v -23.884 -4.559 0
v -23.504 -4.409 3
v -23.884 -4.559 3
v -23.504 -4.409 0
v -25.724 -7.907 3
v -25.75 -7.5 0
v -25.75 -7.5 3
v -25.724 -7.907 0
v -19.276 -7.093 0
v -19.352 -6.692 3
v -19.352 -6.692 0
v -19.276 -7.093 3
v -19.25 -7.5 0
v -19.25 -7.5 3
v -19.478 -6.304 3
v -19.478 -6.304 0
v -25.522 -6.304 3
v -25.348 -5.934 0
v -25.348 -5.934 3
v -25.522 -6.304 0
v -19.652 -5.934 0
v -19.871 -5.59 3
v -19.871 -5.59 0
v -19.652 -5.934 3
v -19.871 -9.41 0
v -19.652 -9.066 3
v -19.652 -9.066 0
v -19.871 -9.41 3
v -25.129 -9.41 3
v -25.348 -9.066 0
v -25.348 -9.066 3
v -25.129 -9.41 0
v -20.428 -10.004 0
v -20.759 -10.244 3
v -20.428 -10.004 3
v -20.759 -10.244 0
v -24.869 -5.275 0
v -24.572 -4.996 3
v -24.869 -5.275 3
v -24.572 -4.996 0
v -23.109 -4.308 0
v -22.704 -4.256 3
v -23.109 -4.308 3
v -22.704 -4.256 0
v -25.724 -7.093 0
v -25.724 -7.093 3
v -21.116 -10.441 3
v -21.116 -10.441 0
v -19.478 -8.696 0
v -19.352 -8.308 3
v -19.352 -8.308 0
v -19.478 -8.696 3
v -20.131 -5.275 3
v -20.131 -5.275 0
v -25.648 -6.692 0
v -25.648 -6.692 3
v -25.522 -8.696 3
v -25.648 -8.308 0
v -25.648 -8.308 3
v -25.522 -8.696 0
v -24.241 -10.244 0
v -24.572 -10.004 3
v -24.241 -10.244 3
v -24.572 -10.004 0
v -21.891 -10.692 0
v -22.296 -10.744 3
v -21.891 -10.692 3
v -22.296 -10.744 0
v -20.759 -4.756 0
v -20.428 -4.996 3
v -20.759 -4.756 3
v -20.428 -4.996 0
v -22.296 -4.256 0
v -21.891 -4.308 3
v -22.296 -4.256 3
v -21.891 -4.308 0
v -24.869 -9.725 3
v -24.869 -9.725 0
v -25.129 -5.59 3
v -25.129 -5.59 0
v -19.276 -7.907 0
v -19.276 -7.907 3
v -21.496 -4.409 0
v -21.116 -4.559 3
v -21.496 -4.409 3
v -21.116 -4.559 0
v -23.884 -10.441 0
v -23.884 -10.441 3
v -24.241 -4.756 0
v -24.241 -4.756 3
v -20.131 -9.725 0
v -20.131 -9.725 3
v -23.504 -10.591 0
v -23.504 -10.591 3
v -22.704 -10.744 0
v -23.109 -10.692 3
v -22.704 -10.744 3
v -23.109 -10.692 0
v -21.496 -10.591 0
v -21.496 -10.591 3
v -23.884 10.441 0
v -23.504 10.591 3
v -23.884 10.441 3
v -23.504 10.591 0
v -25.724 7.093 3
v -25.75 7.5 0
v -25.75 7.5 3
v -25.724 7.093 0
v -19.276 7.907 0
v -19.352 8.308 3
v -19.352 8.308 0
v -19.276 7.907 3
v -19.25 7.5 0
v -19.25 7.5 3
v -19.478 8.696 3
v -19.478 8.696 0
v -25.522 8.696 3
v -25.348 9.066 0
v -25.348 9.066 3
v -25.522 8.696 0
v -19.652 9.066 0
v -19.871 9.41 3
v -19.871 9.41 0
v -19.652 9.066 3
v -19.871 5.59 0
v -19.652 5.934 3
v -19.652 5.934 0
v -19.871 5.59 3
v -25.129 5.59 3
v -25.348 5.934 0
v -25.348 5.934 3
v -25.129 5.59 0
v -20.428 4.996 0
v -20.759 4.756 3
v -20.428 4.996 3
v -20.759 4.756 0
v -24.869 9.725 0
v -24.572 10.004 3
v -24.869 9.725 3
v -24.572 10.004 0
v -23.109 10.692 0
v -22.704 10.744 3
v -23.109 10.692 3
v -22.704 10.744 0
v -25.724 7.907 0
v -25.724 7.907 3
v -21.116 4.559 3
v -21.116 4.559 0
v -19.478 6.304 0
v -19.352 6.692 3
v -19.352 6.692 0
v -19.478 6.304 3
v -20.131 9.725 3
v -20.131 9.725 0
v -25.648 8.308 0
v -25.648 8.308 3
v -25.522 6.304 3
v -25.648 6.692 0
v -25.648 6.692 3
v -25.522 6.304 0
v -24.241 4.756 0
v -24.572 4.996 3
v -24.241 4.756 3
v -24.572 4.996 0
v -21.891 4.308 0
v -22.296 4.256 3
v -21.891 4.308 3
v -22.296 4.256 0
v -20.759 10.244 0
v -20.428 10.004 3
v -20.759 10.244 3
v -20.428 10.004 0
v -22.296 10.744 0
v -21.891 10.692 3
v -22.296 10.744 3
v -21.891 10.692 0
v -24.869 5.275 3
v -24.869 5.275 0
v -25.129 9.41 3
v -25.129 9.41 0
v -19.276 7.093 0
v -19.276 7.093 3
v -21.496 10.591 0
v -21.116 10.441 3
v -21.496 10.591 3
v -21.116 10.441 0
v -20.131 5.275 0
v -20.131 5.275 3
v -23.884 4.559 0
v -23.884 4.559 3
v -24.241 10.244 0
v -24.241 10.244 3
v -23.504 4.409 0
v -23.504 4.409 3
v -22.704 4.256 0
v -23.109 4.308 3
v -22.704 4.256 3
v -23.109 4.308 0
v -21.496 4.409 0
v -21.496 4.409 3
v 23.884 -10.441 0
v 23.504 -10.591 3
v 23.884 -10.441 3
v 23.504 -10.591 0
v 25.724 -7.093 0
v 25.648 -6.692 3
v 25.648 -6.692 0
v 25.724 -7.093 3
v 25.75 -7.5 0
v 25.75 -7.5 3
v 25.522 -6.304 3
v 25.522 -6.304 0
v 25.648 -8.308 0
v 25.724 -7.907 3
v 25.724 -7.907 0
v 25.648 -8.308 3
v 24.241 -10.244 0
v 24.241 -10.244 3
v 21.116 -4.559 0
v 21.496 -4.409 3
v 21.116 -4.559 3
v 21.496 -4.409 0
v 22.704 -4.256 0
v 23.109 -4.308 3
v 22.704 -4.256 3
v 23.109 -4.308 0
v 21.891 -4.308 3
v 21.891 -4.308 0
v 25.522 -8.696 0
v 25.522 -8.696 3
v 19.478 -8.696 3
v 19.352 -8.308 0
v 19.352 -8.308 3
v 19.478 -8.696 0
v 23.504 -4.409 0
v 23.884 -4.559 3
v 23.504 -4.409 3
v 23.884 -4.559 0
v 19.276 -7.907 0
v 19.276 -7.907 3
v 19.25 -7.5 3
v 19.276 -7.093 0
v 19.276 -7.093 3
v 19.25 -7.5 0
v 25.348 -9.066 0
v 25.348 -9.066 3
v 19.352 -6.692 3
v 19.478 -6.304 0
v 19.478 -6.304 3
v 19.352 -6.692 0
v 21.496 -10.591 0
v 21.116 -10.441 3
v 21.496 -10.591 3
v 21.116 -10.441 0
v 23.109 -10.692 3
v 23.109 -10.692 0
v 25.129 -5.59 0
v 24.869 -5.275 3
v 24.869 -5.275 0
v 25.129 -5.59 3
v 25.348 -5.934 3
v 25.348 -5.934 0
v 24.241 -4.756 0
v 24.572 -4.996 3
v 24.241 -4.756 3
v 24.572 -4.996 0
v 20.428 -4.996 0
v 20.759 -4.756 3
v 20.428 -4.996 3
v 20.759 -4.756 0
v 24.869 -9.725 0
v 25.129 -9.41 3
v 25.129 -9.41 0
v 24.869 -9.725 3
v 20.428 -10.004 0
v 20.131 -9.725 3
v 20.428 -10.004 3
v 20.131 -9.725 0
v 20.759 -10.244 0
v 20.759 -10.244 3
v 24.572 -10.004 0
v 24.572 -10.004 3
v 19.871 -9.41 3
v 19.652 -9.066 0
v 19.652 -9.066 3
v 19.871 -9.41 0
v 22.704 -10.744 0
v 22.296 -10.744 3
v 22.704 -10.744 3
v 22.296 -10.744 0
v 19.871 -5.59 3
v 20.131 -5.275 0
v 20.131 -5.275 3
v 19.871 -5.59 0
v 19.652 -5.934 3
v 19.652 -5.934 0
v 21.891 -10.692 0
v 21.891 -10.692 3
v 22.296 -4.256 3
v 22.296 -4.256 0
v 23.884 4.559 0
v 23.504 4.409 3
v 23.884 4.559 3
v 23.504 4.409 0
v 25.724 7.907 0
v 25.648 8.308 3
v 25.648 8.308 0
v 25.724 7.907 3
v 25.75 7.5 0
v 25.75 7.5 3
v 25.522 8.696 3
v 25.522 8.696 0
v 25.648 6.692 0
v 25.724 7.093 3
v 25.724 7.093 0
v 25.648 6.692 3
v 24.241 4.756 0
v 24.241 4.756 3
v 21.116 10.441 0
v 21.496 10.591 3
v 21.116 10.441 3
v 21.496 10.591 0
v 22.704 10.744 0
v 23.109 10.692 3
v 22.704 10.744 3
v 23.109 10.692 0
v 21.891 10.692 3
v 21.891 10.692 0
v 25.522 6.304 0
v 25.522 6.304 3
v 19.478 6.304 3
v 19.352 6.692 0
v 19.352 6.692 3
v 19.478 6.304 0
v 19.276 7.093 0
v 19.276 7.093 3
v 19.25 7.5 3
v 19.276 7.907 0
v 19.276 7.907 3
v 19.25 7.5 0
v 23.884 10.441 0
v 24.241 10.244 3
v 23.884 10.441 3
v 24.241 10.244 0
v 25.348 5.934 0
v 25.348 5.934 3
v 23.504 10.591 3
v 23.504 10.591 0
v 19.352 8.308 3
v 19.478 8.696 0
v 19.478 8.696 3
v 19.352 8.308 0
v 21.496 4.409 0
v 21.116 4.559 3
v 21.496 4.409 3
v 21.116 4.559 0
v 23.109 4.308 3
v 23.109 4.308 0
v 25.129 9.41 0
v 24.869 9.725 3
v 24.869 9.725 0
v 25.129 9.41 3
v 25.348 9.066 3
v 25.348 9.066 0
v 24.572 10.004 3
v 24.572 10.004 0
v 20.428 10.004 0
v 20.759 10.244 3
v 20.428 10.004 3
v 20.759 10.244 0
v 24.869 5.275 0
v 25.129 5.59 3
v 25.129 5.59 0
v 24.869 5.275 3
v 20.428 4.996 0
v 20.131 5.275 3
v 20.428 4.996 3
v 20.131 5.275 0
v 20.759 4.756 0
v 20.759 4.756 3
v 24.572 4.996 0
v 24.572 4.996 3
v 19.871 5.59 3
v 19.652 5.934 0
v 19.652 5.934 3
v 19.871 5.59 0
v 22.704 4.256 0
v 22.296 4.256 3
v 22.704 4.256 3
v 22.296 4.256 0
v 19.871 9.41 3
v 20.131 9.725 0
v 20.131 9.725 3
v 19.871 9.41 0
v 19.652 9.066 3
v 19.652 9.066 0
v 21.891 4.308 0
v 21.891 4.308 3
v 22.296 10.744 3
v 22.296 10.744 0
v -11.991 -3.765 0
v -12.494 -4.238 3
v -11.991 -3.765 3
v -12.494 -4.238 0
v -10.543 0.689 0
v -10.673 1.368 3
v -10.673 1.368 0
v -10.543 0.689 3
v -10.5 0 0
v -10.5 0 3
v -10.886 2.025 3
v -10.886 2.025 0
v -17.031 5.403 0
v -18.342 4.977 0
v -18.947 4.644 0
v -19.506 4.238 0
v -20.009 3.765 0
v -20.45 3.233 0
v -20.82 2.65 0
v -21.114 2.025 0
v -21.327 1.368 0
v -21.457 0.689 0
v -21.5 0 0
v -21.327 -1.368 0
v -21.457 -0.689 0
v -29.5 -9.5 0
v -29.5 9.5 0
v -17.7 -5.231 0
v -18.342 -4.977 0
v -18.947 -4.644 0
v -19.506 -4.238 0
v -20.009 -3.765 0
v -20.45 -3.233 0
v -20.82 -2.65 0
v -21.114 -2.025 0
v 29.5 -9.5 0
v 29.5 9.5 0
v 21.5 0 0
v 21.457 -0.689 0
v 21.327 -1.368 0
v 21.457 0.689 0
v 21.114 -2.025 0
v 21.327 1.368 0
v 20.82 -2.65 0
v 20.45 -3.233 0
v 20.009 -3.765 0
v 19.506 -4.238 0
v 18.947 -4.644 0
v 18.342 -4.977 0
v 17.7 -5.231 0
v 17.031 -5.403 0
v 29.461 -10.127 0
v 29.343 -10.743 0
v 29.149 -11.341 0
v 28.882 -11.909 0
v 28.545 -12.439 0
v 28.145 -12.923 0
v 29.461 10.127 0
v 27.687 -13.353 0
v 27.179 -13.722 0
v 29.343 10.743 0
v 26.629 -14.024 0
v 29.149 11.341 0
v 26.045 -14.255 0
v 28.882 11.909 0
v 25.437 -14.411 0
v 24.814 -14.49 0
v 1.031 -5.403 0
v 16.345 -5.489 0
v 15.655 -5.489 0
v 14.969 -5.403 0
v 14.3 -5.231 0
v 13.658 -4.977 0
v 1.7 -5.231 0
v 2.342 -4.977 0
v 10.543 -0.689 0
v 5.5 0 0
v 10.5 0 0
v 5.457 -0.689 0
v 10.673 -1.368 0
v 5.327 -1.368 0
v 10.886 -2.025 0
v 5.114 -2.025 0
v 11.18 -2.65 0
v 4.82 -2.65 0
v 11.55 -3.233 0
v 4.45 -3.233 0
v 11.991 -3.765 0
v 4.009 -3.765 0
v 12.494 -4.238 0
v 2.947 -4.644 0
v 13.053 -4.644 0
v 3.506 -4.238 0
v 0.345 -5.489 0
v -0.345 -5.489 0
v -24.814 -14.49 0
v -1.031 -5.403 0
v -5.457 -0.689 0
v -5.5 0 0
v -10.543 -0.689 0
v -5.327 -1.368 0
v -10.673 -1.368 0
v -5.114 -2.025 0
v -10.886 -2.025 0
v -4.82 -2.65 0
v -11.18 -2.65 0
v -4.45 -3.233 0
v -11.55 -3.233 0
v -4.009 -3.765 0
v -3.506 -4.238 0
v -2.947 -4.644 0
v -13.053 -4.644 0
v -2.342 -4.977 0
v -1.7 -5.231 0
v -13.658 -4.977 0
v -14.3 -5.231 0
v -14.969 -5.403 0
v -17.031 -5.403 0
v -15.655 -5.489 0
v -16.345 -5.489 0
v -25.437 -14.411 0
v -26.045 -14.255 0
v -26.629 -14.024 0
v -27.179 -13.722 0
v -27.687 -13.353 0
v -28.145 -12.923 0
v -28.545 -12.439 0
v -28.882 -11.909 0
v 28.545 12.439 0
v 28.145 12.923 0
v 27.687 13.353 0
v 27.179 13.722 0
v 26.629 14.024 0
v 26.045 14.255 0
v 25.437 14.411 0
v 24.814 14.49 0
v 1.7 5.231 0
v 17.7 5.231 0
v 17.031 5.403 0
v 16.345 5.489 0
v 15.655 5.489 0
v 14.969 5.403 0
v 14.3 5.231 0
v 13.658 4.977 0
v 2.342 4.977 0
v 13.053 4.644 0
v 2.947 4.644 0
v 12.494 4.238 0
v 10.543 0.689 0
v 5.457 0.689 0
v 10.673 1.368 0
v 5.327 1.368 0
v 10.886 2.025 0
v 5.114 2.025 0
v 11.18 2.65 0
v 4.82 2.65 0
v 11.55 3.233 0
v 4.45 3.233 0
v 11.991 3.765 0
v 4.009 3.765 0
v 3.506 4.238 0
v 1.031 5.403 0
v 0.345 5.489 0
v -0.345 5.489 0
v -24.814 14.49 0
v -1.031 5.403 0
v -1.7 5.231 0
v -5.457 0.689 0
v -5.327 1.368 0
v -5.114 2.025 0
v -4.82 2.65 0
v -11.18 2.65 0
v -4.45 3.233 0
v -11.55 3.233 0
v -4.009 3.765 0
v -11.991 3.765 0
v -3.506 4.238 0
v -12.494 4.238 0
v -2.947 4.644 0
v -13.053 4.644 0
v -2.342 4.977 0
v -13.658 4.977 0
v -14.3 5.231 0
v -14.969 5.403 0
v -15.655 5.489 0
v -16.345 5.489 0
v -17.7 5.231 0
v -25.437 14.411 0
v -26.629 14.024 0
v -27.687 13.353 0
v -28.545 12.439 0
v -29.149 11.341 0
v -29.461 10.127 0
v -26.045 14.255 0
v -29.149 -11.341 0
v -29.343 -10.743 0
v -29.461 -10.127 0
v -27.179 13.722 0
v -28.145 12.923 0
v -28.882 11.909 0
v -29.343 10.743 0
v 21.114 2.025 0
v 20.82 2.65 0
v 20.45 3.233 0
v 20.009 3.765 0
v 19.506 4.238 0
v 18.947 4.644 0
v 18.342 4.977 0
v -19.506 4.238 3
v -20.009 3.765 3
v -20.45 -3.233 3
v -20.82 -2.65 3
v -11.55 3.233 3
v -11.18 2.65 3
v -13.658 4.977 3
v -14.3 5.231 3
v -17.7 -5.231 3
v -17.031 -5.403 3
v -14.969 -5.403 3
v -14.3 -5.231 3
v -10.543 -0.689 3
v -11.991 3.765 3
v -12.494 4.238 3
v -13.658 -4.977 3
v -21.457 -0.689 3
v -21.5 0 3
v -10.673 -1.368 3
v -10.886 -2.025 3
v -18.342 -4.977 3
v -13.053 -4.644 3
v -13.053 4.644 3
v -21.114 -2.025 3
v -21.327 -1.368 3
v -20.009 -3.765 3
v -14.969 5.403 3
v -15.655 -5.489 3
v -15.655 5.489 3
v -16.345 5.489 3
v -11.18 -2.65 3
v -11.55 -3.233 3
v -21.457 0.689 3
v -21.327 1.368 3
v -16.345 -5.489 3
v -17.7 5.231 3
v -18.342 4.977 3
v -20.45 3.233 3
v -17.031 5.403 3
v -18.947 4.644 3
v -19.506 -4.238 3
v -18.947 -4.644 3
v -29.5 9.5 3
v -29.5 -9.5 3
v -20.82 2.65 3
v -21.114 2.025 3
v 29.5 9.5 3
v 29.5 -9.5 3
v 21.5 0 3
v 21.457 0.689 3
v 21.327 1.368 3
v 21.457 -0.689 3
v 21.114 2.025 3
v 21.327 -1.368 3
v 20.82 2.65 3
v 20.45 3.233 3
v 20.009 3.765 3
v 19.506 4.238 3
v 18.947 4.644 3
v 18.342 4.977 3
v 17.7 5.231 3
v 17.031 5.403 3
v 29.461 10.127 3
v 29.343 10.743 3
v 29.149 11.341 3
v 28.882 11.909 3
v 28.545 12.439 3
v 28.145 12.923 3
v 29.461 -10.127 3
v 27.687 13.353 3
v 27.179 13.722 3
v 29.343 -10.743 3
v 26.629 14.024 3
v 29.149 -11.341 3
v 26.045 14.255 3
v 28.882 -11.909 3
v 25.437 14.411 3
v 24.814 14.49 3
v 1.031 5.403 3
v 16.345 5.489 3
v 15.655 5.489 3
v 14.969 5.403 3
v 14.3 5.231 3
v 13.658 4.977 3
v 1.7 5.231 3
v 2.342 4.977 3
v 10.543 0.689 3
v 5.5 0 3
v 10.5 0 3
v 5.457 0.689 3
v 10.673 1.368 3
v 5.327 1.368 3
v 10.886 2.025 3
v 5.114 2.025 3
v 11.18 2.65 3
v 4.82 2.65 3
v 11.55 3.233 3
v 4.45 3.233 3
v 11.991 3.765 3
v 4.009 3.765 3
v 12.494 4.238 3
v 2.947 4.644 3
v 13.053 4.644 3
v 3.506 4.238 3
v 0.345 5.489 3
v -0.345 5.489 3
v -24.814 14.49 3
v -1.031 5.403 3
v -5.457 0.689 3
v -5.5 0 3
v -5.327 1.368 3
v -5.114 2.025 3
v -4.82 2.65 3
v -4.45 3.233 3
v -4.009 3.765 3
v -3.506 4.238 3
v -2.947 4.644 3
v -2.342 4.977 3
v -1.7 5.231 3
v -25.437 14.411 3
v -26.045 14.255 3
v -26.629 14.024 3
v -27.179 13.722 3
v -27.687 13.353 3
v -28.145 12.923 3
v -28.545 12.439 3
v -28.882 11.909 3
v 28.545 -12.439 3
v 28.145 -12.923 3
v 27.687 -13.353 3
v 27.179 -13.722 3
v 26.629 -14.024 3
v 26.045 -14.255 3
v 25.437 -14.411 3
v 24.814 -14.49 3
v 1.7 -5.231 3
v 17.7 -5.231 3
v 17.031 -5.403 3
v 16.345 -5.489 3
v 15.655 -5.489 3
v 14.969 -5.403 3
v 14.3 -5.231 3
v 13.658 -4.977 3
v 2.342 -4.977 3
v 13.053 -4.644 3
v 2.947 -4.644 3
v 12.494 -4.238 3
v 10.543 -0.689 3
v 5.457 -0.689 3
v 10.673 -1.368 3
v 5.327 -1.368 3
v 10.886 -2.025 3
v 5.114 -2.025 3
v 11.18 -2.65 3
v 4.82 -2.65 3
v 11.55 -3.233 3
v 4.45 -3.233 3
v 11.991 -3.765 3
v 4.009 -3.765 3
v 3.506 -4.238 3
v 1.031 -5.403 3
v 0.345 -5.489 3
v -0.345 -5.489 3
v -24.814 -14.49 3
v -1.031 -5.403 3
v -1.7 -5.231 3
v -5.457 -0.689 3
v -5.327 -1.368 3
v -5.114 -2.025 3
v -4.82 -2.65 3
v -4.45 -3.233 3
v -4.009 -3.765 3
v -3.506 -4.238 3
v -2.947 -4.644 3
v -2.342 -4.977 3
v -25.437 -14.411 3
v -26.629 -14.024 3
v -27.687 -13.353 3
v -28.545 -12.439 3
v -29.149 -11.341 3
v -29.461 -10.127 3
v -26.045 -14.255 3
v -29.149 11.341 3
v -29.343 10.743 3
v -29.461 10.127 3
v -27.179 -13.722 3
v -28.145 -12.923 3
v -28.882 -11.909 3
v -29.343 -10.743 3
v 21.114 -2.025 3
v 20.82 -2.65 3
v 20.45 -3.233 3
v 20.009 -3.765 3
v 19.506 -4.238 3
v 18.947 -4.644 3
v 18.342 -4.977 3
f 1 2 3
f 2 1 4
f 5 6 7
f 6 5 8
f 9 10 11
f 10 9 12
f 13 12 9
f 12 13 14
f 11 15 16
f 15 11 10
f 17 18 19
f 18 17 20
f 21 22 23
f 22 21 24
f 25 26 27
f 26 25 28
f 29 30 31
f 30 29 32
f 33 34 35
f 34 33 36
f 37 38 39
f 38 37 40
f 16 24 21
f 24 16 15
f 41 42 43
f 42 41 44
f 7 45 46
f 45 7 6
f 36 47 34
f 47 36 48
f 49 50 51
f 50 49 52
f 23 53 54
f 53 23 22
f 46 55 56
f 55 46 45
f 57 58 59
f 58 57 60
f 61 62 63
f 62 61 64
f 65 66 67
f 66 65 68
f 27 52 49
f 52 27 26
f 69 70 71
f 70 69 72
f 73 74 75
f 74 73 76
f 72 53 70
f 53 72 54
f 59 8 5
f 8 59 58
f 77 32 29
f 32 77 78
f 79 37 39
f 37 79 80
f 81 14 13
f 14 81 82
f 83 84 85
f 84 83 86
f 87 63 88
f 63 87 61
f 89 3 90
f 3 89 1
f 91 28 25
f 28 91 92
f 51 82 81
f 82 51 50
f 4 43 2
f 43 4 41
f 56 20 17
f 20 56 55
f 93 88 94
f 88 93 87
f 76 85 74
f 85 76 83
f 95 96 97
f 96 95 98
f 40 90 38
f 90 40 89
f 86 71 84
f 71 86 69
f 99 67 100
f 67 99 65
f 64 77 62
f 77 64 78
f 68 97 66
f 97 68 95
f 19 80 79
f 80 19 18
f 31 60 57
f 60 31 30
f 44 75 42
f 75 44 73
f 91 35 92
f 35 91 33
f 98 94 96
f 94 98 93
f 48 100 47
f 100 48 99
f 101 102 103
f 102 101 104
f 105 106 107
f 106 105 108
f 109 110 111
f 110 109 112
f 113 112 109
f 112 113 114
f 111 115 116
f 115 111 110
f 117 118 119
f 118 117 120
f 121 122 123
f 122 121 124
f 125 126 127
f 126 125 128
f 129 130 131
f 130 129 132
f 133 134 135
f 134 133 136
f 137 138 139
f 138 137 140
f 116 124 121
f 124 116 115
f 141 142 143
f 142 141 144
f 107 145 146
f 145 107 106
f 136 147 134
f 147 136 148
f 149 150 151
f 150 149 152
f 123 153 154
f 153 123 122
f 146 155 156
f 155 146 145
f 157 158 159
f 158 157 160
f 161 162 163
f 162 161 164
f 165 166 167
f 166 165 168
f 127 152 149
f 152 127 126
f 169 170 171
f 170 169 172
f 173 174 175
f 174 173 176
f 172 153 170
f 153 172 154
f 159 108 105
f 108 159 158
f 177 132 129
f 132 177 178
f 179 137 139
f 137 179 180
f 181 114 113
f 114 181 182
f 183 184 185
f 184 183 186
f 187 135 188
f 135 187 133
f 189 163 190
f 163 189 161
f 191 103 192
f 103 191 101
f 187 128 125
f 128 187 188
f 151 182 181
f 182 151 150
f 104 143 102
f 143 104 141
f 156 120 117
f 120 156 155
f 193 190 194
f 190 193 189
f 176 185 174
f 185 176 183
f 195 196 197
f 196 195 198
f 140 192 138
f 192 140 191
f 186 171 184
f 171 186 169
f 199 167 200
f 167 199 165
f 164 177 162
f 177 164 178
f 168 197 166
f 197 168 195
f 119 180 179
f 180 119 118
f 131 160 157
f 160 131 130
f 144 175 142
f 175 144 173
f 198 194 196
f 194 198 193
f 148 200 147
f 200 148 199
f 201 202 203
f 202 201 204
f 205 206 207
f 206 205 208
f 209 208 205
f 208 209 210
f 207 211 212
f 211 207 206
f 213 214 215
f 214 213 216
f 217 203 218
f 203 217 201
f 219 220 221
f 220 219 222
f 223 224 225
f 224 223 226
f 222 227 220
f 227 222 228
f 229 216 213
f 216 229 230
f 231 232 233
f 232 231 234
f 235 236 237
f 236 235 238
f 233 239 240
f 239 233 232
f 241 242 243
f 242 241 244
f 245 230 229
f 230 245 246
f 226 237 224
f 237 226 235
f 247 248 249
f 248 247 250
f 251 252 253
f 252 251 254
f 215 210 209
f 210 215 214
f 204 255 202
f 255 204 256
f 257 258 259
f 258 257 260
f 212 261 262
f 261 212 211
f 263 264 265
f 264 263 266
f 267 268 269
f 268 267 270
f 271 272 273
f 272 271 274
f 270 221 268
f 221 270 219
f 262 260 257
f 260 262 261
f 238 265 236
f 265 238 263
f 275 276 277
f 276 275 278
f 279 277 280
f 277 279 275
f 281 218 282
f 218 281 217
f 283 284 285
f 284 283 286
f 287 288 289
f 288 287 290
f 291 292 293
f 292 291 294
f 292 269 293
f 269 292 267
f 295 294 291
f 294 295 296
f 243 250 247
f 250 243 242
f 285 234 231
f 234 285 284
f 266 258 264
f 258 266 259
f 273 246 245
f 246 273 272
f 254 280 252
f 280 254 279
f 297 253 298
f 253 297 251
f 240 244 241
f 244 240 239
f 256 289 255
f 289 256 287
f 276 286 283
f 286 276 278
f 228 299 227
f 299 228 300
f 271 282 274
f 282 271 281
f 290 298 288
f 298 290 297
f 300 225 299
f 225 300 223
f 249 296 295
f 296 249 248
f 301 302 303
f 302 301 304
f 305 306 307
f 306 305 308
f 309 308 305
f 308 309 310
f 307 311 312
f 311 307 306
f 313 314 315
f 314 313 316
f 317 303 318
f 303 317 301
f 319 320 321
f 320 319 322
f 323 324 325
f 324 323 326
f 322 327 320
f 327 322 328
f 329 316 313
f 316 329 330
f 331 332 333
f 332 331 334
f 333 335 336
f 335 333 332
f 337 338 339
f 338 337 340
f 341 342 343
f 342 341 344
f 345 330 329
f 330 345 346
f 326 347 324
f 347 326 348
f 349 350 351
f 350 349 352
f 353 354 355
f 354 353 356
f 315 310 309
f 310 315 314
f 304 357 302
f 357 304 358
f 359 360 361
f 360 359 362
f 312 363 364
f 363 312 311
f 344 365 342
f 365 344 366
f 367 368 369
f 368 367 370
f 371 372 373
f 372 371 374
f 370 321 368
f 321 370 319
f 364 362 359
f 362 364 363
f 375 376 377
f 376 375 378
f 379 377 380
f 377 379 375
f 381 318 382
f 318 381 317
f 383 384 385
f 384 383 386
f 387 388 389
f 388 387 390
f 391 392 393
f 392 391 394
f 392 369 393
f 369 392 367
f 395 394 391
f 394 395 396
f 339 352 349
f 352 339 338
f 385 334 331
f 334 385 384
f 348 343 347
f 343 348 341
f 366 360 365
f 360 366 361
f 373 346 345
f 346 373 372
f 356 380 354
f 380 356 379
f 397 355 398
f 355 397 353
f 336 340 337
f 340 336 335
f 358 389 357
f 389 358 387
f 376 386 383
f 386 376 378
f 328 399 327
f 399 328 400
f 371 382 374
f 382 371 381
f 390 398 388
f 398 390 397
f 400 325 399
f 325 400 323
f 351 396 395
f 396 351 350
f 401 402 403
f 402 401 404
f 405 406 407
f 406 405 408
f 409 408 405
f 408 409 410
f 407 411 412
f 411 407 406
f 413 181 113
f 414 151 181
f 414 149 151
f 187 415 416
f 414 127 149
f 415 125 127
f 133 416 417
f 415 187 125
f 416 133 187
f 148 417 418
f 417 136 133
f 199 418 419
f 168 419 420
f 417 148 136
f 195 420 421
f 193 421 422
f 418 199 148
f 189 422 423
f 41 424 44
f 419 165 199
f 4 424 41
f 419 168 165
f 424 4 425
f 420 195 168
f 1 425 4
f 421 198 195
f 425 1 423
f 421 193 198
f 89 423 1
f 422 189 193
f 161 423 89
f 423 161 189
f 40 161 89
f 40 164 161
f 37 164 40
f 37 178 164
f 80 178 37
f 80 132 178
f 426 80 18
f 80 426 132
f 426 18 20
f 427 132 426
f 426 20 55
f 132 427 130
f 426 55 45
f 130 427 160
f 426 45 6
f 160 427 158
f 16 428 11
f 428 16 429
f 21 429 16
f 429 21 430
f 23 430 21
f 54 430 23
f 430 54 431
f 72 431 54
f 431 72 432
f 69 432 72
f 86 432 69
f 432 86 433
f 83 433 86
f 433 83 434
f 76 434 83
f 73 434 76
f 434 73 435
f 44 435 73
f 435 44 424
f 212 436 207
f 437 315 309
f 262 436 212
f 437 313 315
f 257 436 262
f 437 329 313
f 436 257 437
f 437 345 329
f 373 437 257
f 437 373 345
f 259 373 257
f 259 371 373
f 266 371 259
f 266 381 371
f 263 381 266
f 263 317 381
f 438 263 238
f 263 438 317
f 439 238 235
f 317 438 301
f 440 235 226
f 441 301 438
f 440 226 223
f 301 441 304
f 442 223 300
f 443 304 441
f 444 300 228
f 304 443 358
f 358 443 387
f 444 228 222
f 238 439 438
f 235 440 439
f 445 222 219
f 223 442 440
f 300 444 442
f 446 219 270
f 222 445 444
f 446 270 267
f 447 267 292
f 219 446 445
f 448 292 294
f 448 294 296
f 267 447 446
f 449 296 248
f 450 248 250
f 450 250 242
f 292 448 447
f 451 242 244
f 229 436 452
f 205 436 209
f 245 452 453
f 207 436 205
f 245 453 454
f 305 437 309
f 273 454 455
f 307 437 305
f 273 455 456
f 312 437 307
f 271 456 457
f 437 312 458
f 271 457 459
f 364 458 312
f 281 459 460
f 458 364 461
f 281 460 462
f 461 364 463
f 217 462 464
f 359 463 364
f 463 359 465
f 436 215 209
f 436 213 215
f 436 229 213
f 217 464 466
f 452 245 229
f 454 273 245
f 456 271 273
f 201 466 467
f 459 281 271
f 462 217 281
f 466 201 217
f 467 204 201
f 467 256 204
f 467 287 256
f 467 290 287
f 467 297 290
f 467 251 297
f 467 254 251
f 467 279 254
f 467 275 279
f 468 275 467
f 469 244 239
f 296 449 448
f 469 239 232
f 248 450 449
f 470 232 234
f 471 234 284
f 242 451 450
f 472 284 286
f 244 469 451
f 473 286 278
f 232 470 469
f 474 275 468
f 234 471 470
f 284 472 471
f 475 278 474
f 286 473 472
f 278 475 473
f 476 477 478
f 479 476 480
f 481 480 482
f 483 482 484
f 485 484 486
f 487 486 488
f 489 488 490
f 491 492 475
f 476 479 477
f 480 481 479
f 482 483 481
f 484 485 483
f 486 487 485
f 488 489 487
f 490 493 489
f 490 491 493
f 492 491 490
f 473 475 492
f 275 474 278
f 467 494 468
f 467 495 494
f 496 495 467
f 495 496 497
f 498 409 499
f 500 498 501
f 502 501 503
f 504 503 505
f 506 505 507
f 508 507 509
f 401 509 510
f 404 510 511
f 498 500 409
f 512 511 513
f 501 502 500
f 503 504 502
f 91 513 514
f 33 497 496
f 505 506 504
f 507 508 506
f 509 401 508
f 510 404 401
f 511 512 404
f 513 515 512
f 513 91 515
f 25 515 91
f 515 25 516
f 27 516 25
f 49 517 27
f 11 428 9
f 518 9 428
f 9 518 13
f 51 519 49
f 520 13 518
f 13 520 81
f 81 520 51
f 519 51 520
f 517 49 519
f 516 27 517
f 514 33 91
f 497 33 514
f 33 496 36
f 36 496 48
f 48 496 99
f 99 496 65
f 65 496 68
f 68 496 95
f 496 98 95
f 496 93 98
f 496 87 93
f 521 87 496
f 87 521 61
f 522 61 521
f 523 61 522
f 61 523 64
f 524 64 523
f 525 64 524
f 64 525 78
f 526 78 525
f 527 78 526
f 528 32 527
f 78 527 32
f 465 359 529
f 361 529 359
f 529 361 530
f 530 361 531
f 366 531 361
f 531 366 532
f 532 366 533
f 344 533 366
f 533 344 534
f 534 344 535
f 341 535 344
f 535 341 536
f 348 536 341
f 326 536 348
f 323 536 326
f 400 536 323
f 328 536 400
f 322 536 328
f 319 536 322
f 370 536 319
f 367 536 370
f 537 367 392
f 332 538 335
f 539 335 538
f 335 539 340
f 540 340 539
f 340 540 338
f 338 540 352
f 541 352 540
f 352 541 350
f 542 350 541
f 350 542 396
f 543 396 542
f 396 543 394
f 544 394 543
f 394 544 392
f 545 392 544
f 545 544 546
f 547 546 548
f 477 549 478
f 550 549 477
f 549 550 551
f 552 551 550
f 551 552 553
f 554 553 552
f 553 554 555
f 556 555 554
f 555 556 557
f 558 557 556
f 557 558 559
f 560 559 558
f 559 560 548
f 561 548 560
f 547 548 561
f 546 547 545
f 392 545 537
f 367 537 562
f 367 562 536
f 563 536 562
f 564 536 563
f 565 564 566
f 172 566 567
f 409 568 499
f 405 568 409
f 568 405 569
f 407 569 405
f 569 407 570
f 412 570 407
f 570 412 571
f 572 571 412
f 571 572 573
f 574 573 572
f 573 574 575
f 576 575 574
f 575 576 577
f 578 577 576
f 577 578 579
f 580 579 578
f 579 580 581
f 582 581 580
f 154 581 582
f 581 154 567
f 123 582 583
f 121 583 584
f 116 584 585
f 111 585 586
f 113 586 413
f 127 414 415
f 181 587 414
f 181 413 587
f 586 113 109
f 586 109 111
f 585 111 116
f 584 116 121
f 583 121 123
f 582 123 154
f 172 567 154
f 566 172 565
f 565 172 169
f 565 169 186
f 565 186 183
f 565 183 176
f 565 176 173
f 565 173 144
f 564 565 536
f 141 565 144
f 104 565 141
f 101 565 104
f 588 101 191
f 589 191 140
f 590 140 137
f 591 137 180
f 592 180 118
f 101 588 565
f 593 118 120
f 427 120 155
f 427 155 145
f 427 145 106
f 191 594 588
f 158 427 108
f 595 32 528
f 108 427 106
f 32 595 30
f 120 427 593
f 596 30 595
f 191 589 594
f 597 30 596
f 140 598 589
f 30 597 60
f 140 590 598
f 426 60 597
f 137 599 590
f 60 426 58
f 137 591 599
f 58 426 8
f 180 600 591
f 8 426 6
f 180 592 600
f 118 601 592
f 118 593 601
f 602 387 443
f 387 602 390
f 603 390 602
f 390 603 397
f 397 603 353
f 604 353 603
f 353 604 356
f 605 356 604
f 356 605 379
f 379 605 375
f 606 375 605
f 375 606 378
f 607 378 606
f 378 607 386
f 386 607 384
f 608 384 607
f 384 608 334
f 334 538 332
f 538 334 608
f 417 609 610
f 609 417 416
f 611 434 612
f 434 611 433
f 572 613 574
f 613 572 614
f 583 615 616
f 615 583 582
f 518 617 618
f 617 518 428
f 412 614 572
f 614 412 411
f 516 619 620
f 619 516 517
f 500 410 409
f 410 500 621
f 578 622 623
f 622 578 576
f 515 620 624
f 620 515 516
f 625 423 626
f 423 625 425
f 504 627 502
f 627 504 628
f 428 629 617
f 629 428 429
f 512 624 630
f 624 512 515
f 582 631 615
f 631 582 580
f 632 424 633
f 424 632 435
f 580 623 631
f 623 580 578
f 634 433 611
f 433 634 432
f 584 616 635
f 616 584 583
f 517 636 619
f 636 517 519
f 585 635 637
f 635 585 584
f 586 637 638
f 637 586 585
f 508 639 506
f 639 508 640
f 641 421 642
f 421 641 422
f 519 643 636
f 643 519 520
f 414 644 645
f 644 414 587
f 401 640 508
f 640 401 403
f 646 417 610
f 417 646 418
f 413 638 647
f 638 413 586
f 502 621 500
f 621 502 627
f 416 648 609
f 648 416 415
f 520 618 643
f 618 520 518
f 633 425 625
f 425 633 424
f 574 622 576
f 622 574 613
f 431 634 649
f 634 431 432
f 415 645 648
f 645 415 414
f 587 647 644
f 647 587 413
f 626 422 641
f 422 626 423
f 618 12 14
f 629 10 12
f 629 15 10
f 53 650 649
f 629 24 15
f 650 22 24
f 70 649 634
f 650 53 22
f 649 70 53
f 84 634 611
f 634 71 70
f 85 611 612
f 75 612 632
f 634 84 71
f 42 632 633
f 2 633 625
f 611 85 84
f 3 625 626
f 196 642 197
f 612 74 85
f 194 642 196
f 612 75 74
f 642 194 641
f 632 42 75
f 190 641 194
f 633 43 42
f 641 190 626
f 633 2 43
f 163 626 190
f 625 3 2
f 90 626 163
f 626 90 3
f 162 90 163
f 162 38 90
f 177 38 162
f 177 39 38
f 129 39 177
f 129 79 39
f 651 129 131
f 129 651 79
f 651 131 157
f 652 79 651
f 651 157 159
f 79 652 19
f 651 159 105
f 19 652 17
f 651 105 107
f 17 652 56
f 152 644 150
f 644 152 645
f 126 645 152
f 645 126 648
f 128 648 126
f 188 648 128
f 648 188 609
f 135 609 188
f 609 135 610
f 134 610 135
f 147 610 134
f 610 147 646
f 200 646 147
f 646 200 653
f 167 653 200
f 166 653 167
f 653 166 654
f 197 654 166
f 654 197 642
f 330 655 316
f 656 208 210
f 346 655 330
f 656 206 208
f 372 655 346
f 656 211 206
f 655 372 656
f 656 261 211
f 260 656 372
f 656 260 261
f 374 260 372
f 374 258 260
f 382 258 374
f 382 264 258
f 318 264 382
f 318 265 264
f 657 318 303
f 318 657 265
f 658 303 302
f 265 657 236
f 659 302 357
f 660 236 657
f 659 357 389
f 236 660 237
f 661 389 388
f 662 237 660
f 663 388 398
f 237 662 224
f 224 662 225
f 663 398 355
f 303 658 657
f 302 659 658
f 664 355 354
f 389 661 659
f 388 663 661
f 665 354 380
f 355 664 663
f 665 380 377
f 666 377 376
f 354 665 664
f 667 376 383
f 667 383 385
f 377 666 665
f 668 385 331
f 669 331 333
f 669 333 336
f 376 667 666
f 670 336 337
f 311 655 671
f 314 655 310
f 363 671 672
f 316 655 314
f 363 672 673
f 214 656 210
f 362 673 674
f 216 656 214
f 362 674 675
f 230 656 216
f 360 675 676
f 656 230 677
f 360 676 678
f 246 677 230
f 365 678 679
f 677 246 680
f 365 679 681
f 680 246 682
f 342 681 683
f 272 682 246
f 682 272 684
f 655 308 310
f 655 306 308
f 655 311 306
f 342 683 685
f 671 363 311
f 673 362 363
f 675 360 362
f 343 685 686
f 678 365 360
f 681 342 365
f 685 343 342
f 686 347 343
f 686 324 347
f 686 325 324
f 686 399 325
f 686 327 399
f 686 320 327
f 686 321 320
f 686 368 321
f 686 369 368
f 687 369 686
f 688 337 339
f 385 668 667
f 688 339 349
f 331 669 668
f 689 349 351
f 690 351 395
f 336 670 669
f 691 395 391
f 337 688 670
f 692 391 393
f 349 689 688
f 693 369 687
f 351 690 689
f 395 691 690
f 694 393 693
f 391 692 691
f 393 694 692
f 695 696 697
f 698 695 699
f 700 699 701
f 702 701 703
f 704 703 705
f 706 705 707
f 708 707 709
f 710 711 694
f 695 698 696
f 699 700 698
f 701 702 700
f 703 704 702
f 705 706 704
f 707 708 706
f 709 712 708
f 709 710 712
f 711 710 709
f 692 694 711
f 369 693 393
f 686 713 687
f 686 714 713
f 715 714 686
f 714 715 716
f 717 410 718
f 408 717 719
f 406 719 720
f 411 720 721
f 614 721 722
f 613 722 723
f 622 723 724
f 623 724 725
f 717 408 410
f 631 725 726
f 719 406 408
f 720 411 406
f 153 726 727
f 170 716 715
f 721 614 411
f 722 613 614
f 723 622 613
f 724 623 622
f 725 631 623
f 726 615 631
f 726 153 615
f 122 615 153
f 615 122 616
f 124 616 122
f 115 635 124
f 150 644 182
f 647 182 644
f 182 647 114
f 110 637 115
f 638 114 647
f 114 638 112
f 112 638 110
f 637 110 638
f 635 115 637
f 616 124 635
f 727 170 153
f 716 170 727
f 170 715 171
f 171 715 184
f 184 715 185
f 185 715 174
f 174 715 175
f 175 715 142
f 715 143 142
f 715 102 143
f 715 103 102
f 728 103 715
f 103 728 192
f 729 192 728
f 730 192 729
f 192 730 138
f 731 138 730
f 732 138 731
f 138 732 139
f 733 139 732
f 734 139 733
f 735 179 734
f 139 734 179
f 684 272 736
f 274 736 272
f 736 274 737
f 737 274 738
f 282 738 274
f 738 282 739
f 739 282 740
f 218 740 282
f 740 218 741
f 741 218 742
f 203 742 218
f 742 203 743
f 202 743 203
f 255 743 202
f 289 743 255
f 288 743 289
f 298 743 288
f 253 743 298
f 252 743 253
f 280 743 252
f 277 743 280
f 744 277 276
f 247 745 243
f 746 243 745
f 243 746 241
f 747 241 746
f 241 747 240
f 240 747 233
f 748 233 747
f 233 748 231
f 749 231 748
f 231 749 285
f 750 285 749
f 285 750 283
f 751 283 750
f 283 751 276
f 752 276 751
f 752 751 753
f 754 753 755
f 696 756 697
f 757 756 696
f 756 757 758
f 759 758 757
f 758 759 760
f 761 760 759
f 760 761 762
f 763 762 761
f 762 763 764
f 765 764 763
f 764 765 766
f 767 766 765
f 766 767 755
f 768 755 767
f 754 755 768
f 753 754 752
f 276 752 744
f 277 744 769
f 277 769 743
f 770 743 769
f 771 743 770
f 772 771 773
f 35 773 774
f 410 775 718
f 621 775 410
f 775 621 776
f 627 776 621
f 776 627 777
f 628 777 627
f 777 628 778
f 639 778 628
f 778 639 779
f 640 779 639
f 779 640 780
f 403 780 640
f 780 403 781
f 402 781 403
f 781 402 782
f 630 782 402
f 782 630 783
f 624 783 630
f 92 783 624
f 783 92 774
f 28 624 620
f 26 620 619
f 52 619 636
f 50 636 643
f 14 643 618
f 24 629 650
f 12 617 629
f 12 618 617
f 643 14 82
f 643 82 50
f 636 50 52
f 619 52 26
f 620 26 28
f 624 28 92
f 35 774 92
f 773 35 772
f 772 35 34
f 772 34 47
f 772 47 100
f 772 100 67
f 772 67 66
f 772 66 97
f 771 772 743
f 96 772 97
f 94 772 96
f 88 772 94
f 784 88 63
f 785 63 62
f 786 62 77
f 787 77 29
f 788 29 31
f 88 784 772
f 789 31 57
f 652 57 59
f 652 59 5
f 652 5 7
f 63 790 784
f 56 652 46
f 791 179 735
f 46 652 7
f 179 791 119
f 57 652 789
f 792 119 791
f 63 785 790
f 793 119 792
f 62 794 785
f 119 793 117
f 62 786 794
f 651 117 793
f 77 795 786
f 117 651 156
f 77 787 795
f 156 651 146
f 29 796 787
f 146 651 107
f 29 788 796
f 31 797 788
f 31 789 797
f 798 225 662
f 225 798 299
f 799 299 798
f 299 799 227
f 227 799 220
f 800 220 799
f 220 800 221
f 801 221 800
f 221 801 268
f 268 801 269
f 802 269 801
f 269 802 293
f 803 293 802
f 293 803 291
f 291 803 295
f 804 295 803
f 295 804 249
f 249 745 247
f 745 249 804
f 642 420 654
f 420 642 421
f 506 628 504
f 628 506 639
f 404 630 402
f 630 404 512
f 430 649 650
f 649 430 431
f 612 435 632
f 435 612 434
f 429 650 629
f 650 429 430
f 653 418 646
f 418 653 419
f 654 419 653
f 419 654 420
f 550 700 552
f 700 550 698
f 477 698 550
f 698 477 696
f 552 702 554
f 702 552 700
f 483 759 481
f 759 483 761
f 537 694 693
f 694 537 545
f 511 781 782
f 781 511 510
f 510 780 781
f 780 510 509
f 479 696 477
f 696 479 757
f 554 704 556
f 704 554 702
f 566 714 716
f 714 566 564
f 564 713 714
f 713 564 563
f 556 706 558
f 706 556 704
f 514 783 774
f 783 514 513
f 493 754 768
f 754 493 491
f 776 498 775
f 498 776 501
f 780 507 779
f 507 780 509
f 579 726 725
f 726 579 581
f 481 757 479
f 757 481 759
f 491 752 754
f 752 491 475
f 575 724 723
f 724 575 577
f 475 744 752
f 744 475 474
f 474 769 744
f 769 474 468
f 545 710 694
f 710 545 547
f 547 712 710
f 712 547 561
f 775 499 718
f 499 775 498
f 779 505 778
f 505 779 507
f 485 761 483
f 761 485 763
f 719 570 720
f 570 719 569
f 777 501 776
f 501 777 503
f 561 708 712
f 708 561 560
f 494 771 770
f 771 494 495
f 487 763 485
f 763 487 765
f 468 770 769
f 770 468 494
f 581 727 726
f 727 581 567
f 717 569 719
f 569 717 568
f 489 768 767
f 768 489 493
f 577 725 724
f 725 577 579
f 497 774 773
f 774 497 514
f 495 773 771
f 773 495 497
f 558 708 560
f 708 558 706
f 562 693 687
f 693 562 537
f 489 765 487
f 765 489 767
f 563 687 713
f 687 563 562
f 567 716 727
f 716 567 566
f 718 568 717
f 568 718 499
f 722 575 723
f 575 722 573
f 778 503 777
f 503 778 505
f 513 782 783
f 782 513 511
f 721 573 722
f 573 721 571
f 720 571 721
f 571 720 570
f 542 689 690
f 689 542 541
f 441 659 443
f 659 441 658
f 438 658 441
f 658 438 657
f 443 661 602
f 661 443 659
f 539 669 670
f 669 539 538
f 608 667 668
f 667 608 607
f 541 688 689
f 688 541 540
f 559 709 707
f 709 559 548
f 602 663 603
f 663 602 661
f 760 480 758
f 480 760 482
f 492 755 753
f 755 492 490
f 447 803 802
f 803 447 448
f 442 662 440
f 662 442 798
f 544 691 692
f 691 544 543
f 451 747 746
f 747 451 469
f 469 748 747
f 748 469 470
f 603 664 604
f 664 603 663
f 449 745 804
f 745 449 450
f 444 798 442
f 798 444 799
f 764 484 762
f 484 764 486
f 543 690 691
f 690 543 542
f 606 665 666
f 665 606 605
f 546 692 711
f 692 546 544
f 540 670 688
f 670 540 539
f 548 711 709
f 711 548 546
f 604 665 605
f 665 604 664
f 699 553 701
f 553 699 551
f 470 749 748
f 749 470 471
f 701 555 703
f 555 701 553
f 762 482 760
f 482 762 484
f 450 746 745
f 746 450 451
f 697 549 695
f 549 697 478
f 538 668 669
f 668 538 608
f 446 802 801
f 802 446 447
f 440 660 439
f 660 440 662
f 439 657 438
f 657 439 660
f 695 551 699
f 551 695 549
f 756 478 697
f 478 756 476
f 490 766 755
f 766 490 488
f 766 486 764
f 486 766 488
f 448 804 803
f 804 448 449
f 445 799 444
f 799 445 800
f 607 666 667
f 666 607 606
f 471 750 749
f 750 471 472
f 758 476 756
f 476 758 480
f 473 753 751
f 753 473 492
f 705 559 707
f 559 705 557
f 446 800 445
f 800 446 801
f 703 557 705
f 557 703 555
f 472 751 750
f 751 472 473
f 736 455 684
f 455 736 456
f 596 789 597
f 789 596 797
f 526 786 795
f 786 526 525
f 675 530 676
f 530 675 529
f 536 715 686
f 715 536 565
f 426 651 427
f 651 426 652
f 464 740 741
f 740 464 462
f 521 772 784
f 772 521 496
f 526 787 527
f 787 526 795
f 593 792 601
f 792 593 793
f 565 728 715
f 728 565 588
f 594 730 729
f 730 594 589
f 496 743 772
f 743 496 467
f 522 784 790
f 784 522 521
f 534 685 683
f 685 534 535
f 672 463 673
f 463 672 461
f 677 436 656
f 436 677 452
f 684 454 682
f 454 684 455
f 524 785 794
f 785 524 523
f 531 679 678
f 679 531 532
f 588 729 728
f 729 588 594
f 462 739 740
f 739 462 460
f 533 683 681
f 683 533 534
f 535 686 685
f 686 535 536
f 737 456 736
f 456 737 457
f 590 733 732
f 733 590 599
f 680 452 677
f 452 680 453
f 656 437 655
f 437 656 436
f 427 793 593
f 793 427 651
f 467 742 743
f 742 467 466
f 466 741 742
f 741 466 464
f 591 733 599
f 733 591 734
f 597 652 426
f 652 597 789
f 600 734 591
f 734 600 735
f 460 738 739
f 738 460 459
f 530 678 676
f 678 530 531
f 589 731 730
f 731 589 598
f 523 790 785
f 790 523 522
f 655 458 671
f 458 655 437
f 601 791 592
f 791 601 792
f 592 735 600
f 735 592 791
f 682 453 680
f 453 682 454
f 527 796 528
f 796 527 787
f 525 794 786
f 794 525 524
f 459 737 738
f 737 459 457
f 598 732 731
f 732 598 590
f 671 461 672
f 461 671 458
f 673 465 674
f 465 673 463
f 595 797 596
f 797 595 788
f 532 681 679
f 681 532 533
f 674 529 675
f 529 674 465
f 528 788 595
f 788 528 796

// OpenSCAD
$fn = 50;

difference() {
	union() {
		hull() {
			translate(v = [-24.5, 9.5, 0]) {
				cylinder(h = 3, r = 5);
			}
			translate(v = [24.5, 9.5, 0]) {
				cylinder(h = 3, r = 5);
			}
			translate(v = [-24.5, -9.5, 0]) {
				cylinder(h = 3, r = 5);
			}
			translate(v = [24.5, -9.5, 0]) {
				cylinder(h = 3, r = 5);
			}
		}
	}
	union() {
		translate(v = [-22.5, -7.5, -100.0]) {
			cylinder(h = 200, r = 3.25);
		}
		translate(v = [-22.5, 7.5, -100.0]) {
			cylinder(h = 200, r = 3.25);
		}
		translate(v = [22.5, -7.5, -100.0]) {
			cylinder(h = 200, r = 3.25);
		}
		translate(v = [22.5, 7.5, -100.0]) {
			cylinder(h = 200, r = 3.25);
		}
		translate(v = [-22.5, -7.5, -100.0]) {
			cylinder(h = 200, r = 1.8);
		}
		translate(v = [-22.5, 7.5, -100.0]) {
			cylinder(h = 200, r = 1.8);
		}
		translate(v = [22.5, -7.5, -100.0]) {
			cylinder(h = 200, r = 1.8);
		}
		translate(v = [22.5, 7.5, -100.0]) {
			cylinder(h = 200, r = 1.8);
		}
		translate(v = [-16.0, 0, 0.0]) {
			cylinder(h = 3, r = 5.5);
		}
		cylinder(h = 3, r = 5.5);
		translate(v = [16.0, 0, 0.0]) {
			cylinder(h = 3, r = 5.5);
		}
	}
}
